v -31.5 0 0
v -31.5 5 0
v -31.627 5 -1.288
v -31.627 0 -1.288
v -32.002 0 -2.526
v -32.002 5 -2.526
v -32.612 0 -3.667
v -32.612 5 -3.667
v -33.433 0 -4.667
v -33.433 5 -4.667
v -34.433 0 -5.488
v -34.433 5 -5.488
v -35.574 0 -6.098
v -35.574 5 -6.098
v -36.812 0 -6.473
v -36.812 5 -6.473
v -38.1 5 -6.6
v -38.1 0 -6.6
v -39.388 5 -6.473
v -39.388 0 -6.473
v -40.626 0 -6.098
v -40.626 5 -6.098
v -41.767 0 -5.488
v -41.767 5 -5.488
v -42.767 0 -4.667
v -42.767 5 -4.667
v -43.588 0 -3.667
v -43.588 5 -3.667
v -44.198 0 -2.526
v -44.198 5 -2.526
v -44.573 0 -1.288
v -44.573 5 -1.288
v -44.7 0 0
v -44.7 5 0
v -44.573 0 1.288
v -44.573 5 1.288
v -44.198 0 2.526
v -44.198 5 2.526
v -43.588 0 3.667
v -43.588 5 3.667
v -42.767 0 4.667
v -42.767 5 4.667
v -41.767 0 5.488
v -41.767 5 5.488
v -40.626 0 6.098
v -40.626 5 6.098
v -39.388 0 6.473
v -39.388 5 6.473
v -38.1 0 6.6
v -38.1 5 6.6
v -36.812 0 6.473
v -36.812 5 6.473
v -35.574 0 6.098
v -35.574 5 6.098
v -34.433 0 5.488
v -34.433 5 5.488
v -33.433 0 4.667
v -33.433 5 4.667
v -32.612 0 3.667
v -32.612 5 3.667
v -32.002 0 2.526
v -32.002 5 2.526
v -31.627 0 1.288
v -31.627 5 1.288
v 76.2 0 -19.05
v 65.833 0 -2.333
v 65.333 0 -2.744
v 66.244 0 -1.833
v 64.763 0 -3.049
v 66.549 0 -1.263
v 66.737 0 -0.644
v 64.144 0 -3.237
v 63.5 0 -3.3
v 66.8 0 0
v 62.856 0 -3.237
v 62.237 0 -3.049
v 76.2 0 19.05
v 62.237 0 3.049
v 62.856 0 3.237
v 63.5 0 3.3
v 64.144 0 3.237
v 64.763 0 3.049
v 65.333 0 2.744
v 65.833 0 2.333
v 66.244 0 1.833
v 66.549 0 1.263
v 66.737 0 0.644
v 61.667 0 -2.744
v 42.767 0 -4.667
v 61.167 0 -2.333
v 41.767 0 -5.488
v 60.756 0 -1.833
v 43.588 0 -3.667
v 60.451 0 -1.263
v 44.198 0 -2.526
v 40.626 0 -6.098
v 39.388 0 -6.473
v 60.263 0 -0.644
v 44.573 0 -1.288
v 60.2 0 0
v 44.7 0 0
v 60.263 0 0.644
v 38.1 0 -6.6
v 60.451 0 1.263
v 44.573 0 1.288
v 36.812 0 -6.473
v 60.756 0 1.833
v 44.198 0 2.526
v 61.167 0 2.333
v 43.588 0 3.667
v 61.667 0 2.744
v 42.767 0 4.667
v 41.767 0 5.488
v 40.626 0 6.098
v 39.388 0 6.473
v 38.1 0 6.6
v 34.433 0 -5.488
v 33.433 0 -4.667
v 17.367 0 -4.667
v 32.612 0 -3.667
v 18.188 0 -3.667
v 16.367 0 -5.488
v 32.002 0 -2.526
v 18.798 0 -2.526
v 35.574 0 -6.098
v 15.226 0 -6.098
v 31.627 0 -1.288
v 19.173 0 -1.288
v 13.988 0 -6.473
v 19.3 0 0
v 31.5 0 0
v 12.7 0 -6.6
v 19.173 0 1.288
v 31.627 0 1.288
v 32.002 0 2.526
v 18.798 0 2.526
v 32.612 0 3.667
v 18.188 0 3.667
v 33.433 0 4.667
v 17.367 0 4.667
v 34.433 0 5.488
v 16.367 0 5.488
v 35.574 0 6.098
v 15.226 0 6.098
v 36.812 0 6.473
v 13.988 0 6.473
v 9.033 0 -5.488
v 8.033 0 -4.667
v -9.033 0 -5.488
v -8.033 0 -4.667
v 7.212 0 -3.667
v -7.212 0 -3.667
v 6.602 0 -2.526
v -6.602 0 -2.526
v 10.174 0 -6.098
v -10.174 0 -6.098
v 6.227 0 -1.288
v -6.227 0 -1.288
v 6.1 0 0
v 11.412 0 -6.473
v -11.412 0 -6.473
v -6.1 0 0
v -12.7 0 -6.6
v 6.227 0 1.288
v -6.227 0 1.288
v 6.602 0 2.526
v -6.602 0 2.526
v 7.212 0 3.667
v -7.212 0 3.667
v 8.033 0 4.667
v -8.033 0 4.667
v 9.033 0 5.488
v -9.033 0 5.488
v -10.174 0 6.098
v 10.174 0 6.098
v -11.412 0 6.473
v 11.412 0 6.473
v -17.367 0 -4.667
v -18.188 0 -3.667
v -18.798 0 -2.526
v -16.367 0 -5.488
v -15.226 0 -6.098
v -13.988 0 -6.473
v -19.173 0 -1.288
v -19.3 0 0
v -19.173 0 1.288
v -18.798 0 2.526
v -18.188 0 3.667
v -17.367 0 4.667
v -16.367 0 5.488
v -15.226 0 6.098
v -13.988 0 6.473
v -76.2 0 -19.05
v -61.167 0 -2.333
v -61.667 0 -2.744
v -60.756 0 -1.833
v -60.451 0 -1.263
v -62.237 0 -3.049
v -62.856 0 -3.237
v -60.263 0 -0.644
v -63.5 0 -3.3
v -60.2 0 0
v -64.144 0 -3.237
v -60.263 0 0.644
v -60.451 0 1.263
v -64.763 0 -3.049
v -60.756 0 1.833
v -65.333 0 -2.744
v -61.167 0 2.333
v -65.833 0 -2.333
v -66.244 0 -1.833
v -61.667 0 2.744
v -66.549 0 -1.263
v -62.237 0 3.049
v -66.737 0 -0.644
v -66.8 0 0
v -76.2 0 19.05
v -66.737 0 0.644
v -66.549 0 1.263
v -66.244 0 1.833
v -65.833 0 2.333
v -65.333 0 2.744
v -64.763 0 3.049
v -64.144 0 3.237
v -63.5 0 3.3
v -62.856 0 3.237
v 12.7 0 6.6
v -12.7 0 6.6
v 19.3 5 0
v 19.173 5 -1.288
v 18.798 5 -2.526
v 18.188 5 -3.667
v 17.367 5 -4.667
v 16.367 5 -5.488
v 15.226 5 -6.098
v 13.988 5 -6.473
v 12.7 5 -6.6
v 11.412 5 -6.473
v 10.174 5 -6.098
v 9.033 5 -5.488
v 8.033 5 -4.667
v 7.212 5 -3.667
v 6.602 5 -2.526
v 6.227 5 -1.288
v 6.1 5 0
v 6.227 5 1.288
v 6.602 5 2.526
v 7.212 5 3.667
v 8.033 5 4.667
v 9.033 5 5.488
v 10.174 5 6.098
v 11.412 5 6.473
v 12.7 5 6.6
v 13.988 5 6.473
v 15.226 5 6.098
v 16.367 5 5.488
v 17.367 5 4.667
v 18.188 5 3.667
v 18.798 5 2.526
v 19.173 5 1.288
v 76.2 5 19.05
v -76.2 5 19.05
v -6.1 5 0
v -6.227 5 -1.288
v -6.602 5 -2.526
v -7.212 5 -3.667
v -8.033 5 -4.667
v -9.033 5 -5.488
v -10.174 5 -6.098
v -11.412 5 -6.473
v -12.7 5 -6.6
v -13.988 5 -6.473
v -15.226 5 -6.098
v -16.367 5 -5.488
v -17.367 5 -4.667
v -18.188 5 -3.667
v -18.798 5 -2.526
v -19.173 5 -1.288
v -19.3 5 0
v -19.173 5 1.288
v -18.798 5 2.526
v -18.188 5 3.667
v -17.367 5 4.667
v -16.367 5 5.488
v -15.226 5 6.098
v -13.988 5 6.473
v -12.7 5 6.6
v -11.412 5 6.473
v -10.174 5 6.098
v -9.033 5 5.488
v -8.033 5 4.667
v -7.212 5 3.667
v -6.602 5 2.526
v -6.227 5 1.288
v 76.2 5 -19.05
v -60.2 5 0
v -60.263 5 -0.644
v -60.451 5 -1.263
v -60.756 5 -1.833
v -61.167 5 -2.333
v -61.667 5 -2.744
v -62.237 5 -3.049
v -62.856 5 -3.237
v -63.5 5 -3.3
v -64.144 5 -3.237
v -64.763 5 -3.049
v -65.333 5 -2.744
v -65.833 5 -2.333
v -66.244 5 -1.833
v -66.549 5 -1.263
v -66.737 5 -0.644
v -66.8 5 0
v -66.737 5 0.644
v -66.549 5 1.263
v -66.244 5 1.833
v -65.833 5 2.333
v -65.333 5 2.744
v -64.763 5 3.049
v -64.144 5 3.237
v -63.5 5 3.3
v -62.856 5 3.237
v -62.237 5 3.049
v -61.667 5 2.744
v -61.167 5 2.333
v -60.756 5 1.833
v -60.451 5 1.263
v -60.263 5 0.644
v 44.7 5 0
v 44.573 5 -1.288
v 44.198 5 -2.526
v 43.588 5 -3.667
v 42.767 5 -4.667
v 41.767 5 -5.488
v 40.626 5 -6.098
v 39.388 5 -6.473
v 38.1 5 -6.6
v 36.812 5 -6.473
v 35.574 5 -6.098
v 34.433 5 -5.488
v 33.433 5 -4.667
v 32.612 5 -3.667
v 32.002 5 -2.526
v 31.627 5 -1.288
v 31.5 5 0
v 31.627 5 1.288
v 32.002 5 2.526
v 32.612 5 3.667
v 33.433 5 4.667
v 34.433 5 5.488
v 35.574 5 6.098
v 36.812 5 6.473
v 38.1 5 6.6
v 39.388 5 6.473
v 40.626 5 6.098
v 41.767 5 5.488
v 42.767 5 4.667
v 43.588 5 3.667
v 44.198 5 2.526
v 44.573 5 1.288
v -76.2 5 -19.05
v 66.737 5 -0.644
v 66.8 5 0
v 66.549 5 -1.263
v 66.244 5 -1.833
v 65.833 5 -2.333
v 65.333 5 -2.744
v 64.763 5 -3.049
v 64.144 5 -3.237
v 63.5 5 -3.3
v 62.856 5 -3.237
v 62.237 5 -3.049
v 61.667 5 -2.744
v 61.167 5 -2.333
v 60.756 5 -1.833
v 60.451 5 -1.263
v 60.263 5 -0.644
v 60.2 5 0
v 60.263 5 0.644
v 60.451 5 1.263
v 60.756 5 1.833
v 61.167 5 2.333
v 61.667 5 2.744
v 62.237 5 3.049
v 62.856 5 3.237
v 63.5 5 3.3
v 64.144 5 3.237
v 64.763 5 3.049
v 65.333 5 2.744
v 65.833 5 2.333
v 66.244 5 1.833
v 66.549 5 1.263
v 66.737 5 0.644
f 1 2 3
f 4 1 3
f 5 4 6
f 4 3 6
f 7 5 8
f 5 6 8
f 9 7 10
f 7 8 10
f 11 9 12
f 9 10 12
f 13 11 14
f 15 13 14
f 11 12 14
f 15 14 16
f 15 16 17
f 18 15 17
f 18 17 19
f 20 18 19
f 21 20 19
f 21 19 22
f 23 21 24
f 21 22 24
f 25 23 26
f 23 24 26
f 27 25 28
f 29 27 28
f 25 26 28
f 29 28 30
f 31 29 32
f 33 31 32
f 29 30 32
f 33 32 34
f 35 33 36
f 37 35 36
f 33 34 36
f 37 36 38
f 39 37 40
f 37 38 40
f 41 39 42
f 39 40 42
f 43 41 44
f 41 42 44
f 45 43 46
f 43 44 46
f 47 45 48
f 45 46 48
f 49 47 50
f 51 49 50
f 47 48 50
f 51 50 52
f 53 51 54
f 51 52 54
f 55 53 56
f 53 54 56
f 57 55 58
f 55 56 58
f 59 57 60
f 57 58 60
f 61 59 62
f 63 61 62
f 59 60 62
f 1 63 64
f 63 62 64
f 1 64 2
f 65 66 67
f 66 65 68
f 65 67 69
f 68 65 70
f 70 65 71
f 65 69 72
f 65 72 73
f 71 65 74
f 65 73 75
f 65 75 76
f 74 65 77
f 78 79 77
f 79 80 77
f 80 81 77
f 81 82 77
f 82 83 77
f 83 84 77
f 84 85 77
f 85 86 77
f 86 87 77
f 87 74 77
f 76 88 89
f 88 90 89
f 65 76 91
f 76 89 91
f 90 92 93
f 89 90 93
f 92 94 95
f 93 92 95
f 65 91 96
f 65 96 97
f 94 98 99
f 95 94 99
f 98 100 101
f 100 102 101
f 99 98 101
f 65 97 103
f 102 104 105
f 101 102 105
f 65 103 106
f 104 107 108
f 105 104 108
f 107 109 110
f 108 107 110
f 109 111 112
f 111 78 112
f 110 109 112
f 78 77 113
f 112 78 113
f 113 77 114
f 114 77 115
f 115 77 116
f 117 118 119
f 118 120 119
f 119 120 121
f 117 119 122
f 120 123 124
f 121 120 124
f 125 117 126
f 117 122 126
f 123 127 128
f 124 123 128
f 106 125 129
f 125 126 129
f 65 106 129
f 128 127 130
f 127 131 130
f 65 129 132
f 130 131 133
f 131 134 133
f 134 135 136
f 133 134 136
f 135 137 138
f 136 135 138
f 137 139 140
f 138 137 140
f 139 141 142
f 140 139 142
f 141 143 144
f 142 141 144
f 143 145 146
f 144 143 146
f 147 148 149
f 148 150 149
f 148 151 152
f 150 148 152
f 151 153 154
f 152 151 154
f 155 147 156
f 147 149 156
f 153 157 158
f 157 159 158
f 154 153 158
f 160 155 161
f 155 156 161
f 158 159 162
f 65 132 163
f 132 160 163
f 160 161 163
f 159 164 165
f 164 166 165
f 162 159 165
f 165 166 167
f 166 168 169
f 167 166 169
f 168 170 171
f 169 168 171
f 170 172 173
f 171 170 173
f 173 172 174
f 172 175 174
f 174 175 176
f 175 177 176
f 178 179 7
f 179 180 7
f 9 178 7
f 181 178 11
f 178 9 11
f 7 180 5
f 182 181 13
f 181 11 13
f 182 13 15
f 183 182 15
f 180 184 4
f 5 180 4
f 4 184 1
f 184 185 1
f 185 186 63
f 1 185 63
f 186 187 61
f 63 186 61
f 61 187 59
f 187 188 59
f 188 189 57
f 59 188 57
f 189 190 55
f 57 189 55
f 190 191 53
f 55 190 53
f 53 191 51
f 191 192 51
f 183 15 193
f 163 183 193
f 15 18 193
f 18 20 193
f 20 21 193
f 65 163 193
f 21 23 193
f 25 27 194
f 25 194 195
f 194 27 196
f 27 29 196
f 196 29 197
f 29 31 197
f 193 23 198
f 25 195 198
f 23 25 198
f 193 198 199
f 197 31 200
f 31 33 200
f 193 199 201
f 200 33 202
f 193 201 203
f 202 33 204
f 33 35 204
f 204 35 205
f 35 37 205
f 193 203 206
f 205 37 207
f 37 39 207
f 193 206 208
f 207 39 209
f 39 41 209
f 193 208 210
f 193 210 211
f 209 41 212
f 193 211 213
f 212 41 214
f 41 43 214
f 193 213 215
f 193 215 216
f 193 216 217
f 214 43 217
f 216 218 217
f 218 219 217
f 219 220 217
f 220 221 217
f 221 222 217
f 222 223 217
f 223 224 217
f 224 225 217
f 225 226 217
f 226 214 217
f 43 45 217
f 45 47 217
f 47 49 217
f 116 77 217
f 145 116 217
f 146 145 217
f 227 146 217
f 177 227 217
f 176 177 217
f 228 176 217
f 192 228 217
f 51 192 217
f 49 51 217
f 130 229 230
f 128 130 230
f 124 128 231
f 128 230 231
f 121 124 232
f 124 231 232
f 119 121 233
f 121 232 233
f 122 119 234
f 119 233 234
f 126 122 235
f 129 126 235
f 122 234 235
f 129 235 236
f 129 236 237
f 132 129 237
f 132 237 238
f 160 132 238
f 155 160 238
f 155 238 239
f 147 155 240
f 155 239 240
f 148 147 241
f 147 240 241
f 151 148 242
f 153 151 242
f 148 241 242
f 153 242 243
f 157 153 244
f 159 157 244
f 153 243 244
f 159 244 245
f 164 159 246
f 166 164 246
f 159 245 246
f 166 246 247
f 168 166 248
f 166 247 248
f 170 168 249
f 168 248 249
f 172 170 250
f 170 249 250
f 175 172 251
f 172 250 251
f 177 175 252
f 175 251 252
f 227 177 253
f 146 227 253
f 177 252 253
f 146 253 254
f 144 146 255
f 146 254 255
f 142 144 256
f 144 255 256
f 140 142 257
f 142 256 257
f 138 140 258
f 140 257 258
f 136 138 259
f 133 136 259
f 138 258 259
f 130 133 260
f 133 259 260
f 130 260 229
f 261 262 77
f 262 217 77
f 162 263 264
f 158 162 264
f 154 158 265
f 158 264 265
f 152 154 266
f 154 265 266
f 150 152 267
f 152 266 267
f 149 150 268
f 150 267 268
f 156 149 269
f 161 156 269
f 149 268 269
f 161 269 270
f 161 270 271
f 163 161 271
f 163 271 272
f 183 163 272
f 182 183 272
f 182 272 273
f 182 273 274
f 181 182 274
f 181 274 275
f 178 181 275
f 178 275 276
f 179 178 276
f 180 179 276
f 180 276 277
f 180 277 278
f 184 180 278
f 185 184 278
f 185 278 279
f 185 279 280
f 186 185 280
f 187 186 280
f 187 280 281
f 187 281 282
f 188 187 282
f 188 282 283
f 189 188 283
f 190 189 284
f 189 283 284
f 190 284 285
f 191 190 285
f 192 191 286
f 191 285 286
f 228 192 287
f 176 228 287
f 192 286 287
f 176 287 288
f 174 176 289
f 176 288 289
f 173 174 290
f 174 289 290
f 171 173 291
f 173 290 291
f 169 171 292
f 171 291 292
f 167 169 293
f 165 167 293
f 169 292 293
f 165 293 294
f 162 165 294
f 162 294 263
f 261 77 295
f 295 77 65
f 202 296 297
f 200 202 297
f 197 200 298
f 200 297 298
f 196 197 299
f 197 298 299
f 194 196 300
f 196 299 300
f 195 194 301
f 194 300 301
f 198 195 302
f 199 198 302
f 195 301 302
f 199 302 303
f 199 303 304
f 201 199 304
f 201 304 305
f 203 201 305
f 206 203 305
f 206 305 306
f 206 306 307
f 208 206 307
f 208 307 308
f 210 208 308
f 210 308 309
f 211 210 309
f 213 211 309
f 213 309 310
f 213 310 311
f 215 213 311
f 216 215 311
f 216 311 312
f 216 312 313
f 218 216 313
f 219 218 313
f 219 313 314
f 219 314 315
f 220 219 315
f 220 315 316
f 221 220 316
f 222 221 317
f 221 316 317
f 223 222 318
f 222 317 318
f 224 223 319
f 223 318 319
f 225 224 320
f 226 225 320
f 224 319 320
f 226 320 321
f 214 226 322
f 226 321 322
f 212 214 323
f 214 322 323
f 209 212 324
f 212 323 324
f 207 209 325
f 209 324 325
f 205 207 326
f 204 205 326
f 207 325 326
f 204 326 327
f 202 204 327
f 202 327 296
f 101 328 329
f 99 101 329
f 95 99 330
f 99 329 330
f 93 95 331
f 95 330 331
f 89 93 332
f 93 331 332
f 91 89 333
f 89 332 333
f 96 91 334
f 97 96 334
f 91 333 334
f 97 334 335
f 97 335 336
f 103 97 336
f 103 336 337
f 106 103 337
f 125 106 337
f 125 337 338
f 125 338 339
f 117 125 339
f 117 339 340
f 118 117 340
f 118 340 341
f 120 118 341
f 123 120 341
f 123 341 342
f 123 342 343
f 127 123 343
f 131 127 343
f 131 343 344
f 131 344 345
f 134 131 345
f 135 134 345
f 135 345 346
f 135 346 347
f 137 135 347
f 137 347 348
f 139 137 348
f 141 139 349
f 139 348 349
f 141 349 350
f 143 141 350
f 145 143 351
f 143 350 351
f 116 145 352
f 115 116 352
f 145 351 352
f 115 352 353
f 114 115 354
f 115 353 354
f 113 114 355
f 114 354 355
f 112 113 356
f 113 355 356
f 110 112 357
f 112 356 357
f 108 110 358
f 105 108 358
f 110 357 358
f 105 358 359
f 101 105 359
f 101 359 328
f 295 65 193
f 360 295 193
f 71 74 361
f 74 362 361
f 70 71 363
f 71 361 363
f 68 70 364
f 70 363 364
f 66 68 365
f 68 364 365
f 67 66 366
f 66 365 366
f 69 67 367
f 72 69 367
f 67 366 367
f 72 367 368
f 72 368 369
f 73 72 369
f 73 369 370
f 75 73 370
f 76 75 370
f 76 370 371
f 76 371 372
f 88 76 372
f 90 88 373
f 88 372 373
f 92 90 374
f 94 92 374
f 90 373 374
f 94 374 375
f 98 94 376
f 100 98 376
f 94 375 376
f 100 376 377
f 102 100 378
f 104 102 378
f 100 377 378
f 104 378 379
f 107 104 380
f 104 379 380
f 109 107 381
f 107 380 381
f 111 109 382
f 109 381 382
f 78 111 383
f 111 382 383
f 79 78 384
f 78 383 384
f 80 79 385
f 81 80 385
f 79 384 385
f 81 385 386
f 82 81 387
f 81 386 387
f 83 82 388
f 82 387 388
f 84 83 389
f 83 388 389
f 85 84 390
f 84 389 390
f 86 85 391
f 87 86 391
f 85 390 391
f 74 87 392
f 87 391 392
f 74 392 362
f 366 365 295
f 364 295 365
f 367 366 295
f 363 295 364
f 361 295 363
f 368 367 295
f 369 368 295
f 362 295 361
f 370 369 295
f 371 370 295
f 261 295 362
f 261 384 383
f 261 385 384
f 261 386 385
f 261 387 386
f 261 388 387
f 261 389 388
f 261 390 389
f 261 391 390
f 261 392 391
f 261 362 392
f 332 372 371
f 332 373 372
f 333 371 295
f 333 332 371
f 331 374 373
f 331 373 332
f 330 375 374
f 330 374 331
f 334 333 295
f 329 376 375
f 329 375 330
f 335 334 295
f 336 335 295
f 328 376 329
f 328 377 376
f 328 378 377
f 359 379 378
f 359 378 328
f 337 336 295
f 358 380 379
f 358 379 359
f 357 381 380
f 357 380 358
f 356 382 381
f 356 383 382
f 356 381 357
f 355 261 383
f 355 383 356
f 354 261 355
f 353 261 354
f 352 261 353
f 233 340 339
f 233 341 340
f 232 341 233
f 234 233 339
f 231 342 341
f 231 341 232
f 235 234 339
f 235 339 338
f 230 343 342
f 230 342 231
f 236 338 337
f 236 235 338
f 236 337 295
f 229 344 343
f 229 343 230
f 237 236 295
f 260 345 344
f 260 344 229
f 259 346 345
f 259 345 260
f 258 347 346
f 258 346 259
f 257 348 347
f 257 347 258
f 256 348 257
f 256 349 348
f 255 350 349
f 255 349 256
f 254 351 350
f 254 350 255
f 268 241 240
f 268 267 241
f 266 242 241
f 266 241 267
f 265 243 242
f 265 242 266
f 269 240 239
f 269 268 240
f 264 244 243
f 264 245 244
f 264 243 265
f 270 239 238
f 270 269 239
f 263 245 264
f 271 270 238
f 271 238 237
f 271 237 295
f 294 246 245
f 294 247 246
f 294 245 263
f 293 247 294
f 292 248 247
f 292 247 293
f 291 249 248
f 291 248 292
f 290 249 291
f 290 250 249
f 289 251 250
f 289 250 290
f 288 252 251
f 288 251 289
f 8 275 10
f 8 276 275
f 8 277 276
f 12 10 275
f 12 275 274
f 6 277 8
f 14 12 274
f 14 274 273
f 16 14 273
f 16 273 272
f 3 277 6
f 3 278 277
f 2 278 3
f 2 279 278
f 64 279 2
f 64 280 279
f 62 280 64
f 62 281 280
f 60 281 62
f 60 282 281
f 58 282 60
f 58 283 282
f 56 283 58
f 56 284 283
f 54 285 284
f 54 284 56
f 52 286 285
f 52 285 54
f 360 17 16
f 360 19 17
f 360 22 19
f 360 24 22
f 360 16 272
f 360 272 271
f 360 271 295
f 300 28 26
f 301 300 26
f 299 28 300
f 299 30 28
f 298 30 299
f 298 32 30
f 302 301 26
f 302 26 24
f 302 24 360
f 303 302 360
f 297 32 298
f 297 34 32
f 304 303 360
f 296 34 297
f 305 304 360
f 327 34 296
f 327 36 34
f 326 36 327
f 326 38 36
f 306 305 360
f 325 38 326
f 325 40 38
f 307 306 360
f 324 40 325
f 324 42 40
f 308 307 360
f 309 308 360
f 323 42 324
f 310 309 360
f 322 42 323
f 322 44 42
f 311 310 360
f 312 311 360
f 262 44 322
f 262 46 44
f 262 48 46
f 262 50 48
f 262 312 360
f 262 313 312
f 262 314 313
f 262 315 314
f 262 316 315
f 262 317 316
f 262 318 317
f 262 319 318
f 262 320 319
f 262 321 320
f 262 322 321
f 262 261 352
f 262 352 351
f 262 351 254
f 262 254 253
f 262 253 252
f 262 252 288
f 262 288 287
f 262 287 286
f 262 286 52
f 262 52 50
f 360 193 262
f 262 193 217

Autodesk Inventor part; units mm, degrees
ref_plane "YZ Plane" through (0, 0, 0) normal (1, 0, 0) x (0, 1, 0)
ref_plane "XZ Plane" through (0, 0, 0) normal (0, 1, 0) x (-1, 0, 0)
ref_plane "XY Plane" through (0, 0, 0) normal (0, 0, 1) x (1, 0, 0)
sketch "Sketch1" plane through (0, 0, 0) normal (0, 1, 0) x (-1, 0, 0)
  line L0 (76.2, 19.05) -> (-76.2, 19.05)
  line L1 (-76.2, 19.05) -> (-76.2, -19.05)
  line L2 (-76.2, -19.05) -> (76.2, -19.05)
  line L3 (76.2, -19.05) -> (76.2, 19.05)
  line L4 (76.2, 19.05) -> (-76.2, -19.05) construction
  line L5 (-76.2, 19.05) -> (76.2, -19.05) construction
  point P0 (0, 0)
  dimension "d0" = 152.4
  dimension "d1" = 38.1
extrude "Extrusion1" add sketch "Sketch1" along normal blind 5
sketch "Sketch2" plane through (0, 5, 0) normal (0, 1, 0) x (1, 0, 0)
  circle A0 centre (-38.1, 0) radius 6.6
  circle A1 centre (-12.7, 0) radius 6.6
  circle A2 centre (12.7, 0) radius 6.6
  circle A3 centre (38.1, 0) radius 6.6
  line L0 (-76.2, 19.05) -> (-76.2, -19.05) projected
  line L1 (76.2, -19.05) -> (76.2, 19.05) projected
  circle A4 centre (-63.5, 0) radius 3.3
  circle A5 centre (63.5, 0) radius 3.3
  point P0 (0, 0)
  dimension "d4" = 13.2
  dimension "d5" = 13.2
  dimension "d6" = 13.2
  dimension "d7" = 13.2
  dimension "d8" = 25.4
  dimension "d9" = 25.4
  dimension "d10" = 25.4
  dimension "d12" = 38.1
  dimension "d13" = 6.6
  dimension "d14" = 6.6
  dimension "d15" = 12.7
  dimension "d16" = 12.7
extrude "Extrusion2" cut sketch "Sketch2" against normal up to next
properties part number "Vial_Plate"
